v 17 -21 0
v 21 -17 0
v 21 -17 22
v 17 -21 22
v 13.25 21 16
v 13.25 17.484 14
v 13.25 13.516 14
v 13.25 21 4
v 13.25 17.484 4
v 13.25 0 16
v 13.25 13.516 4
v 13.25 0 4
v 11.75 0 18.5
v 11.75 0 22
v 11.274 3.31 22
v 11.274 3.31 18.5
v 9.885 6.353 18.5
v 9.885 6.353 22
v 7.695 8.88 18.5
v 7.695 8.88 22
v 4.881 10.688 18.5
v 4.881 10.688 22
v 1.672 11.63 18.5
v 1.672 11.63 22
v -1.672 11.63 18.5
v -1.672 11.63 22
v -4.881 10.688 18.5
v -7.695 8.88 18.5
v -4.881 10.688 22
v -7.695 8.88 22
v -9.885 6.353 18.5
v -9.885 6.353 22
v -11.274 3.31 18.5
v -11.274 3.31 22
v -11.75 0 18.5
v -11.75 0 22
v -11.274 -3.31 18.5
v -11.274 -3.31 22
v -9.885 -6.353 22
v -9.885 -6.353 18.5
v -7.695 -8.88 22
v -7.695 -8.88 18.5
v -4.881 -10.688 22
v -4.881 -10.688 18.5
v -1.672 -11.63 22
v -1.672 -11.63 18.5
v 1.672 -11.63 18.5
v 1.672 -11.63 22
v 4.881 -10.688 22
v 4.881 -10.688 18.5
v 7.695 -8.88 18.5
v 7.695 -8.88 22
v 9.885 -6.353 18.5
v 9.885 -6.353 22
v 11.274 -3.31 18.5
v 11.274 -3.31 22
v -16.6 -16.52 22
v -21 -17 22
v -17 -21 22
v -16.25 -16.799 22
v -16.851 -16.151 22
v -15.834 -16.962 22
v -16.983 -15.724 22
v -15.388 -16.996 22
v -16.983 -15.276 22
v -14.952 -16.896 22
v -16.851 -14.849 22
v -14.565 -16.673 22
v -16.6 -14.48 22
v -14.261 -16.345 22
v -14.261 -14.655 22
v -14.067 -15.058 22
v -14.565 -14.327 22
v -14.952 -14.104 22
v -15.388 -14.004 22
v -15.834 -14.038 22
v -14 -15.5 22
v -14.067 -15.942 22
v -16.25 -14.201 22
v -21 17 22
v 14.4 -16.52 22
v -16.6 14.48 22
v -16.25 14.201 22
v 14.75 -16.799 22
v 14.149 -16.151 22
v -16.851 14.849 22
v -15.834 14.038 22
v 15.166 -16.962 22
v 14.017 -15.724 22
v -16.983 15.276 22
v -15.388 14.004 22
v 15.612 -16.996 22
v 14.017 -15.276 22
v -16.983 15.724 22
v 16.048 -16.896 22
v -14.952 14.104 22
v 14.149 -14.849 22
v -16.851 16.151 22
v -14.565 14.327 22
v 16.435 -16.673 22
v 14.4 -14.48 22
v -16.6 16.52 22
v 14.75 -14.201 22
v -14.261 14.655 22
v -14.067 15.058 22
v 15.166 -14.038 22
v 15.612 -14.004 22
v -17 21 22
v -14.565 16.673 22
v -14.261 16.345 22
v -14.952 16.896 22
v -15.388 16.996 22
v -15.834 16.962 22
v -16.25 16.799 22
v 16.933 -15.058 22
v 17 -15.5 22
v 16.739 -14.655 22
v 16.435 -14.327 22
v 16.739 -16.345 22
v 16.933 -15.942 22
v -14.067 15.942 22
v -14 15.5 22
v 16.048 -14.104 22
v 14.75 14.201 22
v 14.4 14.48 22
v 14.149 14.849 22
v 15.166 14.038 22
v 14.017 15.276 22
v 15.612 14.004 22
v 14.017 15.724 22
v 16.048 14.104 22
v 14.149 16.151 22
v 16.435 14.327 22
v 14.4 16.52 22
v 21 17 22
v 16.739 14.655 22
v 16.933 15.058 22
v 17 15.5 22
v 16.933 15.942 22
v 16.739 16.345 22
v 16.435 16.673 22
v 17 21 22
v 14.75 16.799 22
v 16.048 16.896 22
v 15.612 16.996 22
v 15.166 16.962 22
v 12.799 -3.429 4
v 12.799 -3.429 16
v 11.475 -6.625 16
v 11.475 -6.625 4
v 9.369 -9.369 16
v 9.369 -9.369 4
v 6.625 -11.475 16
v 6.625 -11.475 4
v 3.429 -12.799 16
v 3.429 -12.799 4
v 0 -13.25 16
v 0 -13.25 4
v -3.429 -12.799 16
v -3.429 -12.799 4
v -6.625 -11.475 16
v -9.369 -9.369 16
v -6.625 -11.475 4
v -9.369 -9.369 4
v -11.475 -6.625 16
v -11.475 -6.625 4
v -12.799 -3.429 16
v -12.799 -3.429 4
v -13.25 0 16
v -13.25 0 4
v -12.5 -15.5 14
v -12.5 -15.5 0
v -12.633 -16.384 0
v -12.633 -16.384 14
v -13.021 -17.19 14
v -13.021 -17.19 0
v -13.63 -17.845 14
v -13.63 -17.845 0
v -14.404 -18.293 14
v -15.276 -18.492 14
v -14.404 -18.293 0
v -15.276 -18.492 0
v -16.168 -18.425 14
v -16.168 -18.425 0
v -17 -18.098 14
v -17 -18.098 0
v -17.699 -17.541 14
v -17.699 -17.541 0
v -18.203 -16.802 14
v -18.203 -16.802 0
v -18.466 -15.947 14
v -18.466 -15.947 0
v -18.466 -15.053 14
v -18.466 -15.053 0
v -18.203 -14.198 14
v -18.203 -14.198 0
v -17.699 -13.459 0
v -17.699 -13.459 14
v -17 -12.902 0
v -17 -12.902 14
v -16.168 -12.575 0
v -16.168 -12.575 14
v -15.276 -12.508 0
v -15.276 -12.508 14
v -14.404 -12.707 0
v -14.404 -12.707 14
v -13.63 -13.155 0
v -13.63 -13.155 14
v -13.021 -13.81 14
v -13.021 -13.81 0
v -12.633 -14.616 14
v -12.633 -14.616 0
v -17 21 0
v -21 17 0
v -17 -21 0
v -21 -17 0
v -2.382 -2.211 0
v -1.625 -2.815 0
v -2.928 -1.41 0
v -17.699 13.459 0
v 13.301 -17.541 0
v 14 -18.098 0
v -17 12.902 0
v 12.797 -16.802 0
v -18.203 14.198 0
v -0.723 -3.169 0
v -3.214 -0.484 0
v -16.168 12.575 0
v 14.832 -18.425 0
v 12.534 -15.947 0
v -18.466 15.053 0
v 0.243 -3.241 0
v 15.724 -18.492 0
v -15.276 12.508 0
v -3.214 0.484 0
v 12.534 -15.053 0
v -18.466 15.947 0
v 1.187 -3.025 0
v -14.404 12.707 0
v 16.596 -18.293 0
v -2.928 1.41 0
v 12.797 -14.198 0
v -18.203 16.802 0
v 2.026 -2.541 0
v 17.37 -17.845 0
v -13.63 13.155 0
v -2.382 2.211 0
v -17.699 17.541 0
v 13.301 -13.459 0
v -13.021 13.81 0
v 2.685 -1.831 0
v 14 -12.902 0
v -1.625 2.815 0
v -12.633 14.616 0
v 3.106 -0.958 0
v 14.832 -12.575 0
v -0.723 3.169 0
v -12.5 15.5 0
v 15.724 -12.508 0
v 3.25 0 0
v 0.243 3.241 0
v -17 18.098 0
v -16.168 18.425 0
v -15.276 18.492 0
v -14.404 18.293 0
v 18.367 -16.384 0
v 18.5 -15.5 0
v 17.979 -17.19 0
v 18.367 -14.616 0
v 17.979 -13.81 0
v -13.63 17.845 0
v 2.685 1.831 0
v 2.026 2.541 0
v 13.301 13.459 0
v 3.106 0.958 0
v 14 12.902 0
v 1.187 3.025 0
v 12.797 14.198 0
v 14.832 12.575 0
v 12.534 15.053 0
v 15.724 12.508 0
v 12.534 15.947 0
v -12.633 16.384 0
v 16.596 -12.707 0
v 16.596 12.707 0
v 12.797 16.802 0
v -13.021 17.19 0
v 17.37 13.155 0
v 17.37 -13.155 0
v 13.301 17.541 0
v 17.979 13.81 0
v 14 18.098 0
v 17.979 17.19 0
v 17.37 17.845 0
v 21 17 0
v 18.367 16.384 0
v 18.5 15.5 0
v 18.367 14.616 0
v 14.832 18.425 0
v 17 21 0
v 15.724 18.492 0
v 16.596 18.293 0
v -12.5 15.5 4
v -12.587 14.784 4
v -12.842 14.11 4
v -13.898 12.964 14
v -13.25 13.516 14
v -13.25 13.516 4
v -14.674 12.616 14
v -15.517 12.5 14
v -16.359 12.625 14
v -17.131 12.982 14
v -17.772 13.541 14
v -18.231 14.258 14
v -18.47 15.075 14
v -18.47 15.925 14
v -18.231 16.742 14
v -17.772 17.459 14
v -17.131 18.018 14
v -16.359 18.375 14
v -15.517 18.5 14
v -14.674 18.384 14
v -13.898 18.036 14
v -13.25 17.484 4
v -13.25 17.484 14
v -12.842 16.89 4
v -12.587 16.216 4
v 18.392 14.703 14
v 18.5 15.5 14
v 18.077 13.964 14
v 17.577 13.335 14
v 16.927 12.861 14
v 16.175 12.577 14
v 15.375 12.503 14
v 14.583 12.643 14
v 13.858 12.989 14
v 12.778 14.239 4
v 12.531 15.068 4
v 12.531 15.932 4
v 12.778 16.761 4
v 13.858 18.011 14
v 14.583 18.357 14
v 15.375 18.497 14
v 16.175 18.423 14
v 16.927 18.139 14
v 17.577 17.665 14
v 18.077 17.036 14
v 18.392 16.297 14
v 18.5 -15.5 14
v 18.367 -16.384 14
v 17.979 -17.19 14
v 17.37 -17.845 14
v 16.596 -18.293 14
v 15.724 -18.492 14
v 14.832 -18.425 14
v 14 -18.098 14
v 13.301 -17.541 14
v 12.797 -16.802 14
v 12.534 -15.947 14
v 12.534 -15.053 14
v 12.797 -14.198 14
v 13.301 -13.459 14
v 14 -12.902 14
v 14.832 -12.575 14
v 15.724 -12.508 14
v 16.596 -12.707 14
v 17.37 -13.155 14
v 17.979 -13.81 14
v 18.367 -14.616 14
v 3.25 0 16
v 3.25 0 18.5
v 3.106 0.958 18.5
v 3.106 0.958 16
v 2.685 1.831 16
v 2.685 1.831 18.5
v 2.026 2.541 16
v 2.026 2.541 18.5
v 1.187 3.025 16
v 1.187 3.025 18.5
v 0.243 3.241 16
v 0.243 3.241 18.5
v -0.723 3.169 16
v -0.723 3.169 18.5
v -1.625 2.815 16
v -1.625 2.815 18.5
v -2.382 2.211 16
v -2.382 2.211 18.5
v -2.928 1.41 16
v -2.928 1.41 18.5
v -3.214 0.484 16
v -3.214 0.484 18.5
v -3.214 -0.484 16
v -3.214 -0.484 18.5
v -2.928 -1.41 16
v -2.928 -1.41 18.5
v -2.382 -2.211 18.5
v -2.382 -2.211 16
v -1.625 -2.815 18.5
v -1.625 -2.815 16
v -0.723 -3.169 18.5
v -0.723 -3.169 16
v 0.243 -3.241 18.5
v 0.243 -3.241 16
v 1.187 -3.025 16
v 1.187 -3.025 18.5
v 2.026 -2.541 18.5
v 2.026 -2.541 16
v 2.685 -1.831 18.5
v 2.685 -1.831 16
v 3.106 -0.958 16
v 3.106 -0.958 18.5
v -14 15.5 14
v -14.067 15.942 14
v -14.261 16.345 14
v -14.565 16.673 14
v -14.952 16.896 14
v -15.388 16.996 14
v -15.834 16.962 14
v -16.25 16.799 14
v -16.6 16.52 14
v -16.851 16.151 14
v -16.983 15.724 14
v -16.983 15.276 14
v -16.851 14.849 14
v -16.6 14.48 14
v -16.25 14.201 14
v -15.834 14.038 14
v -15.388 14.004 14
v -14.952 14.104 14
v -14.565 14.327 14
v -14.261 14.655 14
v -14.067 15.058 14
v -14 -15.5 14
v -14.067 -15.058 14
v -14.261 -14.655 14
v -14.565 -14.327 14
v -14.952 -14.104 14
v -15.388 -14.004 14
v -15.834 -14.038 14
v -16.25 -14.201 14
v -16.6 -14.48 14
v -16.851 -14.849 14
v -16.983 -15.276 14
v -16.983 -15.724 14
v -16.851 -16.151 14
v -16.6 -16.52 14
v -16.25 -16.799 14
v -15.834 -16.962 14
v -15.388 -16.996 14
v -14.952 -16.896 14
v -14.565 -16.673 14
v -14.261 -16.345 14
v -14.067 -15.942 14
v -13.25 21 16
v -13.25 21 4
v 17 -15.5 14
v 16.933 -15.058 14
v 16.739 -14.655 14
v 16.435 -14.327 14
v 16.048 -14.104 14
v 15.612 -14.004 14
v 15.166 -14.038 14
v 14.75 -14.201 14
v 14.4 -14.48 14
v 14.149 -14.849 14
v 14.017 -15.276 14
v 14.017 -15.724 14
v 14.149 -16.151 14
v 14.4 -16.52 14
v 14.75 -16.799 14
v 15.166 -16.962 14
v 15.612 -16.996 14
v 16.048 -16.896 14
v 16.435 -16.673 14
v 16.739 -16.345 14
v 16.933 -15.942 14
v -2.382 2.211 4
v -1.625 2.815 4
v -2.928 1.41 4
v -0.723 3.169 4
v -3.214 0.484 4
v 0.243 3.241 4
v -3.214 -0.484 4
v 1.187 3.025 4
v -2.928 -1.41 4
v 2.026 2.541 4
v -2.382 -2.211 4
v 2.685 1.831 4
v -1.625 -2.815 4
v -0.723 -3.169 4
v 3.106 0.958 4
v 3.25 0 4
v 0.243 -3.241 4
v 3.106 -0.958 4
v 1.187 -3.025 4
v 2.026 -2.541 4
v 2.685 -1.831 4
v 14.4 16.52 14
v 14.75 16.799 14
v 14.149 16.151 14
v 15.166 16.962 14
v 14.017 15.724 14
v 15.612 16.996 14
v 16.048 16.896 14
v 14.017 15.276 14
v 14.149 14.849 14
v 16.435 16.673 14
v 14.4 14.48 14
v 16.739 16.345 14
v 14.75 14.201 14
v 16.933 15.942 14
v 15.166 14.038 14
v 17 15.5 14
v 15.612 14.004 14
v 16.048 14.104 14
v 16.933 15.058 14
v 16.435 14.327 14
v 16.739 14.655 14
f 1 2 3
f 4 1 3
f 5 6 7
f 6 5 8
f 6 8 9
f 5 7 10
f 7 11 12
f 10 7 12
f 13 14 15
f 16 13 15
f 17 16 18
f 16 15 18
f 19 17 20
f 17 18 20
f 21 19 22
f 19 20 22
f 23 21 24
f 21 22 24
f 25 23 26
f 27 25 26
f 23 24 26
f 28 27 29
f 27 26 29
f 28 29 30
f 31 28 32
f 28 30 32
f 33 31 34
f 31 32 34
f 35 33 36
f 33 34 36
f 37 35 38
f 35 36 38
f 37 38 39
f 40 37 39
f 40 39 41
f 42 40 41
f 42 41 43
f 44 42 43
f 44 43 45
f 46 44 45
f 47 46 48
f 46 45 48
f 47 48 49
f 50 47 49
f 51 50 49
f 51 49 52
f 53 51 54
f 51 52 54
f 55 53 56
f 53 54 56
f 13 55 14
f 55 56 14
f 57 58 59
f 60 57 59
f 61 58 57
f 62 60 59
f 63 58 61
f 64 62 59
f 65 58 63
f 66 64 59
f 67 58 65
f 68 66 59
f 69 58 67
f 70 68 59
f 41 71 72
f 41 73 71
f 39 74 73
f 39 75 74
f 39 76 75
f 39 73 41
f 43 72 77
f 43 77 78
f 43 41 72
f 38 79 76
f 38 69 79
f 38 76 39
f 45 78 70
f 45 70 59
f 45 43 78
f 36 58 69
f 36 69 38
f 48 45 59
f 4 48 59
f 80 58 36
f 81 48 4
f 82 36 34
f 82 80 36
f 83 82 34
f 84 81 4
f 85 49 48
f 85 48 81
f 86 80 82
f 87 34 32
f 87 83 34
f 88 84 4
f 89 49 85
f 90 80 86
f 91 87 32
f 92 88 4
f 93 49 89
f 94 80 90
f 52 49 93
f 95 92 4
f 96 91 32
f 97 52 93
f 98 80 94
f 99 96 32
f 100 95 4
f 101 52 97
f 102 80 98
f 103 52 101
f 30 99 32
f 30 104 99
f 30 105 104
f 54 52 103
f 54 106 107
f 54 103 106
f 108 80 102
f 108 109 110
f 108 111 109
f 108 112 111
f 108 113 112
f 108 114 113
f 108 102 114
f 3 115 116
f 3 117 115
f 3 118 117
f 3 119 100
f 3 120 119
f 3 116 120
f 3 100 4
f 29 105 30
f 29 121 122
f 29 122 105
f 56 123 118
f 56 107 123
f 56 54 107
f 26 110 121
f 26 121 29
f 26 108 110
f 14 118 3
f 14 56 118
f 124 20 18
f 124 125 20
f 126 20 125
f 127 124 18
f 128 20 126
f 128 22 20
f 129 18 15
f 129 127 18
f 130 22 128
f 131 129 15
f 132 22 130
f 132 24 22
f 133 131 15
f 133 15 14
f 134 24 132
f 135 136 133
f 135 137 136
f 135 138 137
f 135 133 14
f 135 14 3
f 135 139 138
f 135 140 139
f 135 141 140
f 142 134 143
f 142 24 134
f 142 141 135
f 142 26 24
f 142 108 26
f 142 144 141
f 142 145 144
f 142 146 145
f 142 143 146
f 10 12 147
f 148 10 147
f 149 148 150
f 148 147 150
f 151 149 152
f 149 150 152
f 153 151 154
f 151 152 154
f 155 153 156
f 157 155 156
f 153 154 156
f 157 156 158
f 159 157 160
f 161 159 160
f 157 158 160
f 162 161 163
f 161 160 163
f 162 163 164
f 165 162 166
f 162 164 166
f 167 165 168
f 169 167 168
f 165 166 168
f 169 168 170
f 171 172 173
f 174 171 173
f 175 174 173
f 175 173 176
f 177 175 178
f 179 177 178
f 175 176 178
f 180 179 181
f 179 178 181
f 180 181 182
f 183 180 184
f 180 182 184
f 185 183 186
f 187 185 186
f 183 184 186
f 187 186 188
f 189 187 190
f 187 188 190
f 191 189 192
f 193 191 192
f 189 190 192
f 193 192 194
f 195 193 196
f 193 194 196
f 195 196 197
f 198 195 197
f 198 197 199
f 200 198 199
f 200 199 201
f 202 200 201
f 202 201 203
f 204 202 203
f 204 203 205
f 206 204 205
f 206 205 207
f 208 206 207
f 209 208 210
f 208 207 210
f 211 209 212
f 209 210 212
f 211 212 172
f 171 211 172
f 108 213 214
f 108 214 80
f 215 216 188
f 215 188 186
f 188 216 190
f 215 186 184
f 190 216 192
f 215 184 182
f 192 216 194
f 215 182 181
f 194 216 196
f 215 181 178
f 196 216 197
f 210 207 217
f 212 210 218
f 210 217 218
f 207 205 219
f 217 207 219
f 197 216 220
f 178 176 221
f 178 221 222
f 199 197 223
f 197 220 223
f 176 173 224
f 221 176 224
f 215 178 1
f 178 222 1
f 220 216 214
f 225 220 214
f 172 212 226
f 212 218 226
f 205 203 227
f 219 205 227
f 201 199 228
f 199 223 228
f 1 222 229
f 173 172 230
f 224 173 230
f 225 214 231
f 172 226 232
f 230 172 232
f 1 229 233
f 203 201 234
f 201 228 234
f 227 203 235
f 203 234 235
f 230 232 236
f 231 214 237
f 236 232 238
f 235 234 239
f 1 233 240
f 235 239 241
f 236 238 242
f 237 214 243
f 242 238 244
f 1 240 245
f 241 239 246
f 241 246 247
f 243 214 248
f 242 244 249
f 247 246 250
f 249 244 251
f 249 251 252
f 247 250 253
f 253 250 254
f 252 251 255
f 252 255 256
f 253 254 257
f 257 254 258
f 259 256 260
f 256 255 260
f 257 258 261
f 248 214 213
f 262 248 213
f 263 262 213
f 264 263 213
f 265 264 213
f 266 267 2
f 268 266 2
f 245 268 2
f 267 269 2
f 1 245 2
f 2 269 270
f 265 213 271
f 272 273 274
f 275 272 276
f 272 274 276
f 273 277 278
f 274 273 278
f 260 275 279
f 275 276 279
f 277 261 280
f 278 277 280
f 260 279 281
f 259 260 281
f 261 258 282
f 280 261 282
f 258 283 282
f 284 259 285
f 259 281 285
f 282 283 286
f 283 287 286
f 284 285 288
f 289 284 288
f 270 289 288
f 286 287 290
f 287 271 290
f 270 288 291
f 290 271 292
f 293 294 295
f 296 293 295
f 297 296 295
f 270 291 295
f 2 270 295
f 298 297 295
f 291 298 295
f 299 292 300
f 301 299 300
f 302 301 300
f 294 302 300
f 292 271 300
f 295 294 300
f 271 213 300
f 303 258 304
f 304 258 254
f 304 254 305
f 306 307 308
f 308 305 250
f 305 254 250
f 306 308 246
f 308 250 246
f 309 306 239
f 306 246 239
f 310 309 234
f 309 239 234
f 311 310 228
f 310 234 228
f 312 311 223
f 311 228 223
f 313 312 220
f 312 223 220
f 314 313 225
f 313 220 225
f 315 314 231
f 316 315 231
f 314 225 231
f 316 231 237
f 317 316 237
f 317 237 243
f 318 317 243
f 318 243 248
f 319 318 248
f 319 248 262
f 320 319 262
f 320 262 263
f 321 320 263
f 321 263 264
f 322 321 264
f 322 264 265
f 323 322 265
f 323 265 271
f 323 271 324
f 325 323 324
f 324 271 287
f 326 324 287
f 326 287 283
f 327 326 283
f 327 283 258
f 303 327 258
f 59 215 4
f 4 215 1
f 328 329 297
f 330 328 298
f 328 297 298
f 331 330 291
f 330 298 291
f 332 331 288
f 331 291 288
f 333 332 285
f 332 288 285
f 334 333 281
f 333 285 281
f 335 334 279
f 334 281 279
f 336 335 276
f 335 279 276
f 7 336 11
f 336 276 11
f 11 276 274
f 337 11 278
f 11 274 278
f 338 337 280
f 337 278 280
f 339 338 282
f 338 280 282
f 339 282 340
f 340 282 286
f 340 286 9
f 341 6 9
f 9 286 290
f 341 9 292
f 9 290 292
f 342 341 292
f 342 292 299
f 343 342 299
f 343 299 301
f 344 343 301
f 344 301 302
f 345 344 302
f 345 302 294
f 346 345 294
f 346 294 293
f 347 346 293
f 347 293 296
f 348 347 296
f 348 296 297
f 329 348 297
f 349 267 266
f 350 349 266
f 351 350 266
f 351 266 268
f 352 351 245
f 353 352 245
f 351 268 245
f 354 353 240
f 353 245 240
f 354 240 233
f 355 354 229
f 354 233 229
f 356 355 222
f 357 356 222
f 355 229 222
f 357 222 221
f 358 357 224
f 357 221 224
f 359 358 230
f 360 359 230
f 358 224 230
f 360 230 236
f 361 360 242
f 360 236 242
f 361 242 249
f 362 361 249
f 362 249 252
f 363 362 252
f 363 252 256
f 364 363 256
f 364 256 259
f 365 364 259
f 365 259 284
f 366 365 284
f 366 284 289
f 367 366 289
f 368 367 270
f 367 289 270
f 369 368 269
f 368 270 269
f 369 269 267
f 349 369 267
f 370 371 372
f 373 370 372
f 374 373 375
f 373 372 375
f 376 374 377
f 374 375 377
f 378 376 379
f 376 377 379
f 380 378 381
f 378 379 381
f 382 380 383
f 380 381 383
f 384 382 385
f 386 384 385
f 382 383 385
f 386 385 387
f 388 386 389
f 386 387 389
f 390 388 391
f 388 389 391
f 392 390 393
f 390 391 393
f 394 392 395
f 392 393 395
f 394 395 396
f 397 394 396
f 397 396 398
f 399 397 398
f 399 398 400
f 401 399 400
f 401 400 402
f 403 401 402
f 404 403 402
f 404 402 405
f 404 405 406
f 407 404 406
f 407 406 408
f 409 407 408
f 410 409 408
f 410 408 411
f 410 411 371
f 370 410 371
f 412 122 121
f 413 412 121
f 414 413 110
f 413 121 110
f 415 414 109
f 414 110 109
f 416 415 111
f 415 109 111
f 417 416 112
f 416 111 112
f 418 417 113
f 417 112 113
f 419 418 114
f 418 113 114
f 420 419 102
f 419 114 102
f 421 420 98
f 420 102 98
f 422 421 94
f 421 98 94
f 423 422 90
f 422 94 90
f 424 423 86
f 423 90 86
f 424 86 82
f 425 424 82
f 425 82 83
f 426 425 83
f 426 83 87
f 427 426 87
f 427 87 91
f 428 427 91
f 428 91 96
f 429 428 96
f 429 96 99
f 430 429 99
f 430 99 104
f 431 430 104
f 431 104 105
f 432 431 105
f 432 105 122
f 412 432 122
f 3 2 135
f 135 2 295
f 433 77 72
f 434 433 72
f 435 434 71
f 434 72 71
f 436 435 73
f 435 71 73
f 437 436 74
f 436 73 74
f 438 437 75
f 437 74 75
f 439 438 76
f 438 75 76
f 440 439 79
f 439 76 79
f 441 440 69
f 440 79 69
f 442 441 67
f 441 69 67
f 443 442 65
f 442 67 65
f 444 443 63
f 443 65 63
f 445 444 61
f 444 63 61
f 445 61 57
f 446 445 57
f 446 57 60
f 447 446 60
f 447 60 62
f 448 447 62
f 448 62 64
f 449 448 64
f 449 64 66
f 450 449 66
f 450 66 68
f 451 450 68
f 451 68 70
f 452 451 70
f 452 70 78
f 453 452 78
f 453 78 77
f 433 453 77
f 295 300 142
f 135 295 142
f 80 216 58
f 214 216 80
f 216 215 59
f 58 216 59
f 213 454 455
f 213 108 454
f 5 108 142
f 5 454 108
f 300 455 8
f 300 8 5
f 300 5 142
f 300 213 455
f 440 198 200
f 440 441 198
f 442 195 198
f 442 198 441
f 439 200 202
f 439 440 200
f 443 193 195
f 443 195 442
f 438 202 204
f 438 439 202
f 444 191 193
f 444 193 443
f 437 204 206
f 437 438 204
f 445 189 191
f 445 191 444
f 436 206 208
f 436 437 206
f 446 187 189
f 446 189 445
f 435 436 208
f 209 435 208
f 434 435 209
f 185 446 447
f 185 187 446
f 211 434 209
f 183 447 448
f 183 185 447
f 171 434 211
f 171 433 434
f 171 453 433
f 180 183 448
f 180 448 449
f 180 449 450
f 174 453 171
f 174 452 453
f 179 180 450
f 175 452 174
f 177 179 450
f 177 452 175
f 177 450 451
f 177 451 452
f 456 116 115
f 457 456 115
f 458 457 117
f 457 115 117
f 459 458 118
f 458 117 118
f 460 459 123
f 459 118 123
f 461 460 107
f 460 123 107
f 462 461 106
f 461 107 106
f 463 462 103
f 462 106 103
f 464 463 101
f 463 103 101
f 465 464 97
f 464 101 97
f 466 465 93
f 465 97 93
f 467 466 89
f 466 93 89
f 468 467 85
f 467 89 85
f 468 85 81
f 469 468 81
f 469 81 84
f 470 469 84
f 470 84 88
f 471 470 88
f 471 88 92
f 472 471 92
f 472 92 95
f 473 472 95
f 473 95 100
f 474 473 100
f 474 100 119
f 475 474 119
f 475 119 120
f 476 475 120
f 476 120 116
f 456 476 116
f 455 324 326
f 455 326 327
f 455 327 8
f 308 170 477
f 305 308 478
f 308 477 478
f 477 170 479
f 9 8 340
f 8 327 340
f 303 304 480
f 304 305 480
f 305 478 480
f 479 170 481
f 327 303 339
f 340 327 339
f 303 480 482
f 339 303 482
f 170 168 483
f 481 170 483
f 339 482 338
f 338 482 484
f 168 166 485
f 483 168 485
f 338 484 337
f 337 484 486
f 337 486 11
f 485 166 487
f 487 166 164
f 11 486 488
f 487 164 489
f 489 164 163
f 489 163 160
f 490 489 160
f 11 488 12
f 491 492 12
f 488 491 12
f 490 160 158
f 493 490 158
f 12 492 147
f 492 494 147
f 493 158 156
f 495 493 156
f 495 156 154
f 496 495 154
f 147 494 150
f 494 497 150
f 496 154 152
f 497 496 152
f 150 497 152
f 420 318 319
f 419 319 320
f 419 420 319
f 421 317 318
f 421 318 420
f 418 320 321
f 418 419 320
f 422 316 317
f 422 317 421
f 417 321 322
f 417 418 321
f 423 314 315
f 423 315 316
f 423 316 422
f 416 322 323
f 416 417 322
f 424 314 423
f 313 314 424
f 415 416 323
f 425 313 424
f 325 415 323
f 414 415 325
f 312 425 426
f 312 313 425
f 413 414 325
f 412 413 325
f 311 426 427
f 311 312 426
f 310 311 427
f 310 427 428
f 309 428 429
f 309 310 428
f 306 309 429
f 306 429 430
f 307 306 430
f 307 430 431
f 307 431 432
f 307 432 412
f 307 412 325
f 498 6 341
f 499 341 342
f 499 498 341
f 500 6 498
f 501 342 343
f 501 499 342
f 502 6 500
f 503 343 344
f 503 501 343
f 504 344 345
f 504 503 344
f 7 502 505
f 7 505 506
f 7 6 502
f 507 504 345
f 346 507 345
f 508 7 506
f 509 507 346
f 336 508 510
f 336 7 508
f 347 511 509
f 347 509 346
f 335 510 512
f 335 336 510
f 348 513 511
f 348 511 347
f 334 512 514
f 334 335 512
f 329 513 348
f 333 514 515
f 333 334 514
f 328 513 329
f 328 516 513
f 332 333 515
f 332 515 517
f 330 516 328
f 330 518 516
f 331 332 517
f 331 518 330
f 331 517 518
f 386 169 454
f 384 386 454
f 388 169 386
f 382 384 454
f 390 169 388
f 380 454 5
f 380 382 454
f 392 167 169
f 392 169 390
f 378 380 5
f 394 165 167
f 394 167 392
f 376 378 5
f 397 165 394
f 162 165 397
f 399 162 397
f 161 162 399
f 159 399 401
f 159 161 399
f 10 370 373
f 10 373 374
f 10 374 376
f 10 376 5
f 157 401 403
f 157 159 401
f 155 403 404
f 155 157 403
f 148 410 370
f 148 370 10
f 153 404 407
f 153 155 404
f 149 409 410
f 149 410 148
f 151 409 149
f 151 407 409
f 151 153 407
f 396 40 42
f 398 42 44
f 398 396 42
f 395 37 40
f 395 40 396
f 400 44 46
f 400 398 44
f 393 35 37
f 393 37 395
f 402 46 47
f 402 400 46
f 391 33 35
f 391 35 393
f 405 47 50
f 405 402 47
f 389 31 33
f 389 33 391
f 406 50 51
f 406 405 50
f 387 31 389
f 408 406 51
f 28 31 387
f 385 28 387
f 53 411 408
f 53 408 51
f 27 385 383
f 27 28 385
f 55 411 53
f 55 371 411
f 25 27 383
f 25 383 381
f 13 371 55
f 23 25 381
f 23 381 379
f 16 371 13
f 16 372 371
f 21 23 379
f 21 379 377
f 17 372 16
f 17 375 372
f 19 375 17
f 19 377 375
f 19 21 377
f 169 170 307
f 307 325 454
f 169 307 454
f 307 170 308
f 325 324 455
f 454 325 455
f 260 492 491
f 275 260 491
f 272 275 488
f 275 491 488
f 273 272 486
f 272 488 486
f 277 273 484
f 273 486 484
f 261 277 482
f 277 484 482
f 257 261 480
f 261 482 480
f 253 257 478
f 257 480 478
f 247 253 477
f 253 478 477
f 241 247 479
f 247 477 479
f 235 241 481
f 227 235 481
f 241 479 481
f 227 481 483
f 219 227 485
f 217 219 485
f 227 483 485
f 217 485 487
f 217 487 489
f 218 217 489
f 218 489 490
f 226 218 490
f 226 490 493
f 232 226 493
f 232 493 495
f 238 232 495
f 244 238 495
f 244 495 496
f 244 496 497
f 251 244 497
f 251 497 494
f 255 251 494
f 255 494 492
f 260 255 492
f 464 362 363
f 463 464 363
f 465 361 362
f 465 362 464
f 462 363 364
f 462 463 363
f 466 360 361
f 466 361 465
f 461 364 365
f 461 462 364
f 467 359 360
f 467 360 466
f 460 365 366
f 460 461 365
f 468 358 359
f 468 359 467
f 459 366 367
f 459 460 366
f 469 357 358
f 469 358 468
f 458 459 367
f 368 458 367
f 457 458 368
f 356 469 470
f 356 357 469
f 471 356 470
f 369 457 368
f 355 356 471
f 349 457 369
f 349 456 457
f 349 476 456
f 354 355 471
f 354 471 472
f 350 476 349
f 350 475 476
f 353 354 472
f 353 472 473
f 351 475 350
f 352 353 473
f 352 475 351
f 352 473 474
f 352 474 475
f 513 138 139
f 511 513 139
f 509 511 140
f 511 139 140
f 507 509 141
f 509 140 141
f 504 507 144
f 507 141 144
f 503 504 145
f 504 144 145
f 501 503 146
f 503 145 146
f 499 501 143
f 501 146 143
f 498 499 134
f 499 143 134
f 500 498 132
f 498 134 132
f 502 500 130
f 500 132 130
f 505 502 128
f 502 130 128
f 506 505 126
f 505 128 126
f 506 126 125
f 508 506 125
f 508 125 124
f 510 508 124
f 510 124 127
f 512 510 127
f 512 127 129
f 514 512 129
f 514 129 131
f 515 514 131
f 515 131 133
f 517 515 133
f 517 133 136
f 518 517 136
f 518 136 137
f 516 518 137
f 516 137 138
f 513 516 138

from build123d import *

# Parameters (mm, degrees)
F0_W      = 42
F0_H      = 42
F1_DEPTH  = 22
F2_SIZE   = 4
F3_R      = 11.75
F4_DEPTH  = 3.5
F5_R      = 3.25
F6_DEPTH  = 18.501
F8_START  = -4
F8_DEPTH  = 12
F9_R      = 1.5
F10_DEPTH = 22.001
F11_R     = 3
F12_DEPTH = 14


with BuildPart() as f1:
    # F0 (on Top) → F1 (new body)
    with BuildSketch(Plane.XY):
        Rectangle(F0_W, F0_H)
    extrude(amount=F1_DEPTH)

    # F2
    f2_edges = [f1.edges().sort_by_distance(p)[0] for p in [
        (-21, -21, 11),
        (21, -21, 11),
        (-21, 21, 11),
        (21, 21, 11),
    ]]
    chamfer(f2_edges, length=F2_SIZE)

    # F3 (on face) → F4 (cut)
    with BuildSketch(Plane.XY.offset(22)):
        Circle(F3_R)
    extrude(amount=-F4_DEPTH, mode=Mode.SUBTRACT)

    # F5 (on face) → F6 (cut, through all)
    with BuildSketch(Plane.XY.offset(18.5)):
        Circle(F5_R)
    extrude(amount=-F6_DEPTH, mode=Mode.SUBTRACT)

    # F7 (on face) → F8 (cut)
    with BuildSketch(Plane(origin=(0, 0, 0), x_dir=(1, 0, 0), z_dir=(0, 0, -1)).offset(F8_START)):
        with BuildLine():
            Line((-13.25, 0), (-13.25, -21))
            Line((-13.25, -21), (13.25, -21))
            Line((13.25, -21), (13.25, 0))
            ThreePointArc((13.25, 0), (0, 13.25), (-13.25, 0))
        make_face()
    extrude(amount=-F8_DEPTH, mode=Mode.SUBTRACT)

    # F9 (on face) → F10 (cut, through all)
    with BuildSketch(Plane.XY.offset(22)):
        with Locations((-15.5, 15.5)):
            Circle(F9_R)
        with Locations((15.5, 15.5)):
            Circle(F9_R)
        with Locations((-15.5, -15.5)):
            Circle(F9_R)
        with Locations((15.5, -15.5)):
            Circle(F9_R)
    extrude(amount=-F10_DEPTH, mode=Mode.SUBTRACT)

    # F11 (on face) → F12 (cut)
    with BuildSketch(Plane(origin=(0, 0, 0), x_dir=(1, 0, 0), z_dir=(0, 0, -1))):
        with Locations((-15.5, 15.5)):
            Circle(F11_R)
        with Locations((15.5, 15.5)):
            Circle(F11_R)
        with Locations((-15.5, -15.5)):
            Circle(F11_R)
        with Locations((15.5, -15.5)):
            Circle(F11_R)
    extrude(amount=-F12_DEPTH, mode=Mode.SUBTRACT)


solid = f1.part
